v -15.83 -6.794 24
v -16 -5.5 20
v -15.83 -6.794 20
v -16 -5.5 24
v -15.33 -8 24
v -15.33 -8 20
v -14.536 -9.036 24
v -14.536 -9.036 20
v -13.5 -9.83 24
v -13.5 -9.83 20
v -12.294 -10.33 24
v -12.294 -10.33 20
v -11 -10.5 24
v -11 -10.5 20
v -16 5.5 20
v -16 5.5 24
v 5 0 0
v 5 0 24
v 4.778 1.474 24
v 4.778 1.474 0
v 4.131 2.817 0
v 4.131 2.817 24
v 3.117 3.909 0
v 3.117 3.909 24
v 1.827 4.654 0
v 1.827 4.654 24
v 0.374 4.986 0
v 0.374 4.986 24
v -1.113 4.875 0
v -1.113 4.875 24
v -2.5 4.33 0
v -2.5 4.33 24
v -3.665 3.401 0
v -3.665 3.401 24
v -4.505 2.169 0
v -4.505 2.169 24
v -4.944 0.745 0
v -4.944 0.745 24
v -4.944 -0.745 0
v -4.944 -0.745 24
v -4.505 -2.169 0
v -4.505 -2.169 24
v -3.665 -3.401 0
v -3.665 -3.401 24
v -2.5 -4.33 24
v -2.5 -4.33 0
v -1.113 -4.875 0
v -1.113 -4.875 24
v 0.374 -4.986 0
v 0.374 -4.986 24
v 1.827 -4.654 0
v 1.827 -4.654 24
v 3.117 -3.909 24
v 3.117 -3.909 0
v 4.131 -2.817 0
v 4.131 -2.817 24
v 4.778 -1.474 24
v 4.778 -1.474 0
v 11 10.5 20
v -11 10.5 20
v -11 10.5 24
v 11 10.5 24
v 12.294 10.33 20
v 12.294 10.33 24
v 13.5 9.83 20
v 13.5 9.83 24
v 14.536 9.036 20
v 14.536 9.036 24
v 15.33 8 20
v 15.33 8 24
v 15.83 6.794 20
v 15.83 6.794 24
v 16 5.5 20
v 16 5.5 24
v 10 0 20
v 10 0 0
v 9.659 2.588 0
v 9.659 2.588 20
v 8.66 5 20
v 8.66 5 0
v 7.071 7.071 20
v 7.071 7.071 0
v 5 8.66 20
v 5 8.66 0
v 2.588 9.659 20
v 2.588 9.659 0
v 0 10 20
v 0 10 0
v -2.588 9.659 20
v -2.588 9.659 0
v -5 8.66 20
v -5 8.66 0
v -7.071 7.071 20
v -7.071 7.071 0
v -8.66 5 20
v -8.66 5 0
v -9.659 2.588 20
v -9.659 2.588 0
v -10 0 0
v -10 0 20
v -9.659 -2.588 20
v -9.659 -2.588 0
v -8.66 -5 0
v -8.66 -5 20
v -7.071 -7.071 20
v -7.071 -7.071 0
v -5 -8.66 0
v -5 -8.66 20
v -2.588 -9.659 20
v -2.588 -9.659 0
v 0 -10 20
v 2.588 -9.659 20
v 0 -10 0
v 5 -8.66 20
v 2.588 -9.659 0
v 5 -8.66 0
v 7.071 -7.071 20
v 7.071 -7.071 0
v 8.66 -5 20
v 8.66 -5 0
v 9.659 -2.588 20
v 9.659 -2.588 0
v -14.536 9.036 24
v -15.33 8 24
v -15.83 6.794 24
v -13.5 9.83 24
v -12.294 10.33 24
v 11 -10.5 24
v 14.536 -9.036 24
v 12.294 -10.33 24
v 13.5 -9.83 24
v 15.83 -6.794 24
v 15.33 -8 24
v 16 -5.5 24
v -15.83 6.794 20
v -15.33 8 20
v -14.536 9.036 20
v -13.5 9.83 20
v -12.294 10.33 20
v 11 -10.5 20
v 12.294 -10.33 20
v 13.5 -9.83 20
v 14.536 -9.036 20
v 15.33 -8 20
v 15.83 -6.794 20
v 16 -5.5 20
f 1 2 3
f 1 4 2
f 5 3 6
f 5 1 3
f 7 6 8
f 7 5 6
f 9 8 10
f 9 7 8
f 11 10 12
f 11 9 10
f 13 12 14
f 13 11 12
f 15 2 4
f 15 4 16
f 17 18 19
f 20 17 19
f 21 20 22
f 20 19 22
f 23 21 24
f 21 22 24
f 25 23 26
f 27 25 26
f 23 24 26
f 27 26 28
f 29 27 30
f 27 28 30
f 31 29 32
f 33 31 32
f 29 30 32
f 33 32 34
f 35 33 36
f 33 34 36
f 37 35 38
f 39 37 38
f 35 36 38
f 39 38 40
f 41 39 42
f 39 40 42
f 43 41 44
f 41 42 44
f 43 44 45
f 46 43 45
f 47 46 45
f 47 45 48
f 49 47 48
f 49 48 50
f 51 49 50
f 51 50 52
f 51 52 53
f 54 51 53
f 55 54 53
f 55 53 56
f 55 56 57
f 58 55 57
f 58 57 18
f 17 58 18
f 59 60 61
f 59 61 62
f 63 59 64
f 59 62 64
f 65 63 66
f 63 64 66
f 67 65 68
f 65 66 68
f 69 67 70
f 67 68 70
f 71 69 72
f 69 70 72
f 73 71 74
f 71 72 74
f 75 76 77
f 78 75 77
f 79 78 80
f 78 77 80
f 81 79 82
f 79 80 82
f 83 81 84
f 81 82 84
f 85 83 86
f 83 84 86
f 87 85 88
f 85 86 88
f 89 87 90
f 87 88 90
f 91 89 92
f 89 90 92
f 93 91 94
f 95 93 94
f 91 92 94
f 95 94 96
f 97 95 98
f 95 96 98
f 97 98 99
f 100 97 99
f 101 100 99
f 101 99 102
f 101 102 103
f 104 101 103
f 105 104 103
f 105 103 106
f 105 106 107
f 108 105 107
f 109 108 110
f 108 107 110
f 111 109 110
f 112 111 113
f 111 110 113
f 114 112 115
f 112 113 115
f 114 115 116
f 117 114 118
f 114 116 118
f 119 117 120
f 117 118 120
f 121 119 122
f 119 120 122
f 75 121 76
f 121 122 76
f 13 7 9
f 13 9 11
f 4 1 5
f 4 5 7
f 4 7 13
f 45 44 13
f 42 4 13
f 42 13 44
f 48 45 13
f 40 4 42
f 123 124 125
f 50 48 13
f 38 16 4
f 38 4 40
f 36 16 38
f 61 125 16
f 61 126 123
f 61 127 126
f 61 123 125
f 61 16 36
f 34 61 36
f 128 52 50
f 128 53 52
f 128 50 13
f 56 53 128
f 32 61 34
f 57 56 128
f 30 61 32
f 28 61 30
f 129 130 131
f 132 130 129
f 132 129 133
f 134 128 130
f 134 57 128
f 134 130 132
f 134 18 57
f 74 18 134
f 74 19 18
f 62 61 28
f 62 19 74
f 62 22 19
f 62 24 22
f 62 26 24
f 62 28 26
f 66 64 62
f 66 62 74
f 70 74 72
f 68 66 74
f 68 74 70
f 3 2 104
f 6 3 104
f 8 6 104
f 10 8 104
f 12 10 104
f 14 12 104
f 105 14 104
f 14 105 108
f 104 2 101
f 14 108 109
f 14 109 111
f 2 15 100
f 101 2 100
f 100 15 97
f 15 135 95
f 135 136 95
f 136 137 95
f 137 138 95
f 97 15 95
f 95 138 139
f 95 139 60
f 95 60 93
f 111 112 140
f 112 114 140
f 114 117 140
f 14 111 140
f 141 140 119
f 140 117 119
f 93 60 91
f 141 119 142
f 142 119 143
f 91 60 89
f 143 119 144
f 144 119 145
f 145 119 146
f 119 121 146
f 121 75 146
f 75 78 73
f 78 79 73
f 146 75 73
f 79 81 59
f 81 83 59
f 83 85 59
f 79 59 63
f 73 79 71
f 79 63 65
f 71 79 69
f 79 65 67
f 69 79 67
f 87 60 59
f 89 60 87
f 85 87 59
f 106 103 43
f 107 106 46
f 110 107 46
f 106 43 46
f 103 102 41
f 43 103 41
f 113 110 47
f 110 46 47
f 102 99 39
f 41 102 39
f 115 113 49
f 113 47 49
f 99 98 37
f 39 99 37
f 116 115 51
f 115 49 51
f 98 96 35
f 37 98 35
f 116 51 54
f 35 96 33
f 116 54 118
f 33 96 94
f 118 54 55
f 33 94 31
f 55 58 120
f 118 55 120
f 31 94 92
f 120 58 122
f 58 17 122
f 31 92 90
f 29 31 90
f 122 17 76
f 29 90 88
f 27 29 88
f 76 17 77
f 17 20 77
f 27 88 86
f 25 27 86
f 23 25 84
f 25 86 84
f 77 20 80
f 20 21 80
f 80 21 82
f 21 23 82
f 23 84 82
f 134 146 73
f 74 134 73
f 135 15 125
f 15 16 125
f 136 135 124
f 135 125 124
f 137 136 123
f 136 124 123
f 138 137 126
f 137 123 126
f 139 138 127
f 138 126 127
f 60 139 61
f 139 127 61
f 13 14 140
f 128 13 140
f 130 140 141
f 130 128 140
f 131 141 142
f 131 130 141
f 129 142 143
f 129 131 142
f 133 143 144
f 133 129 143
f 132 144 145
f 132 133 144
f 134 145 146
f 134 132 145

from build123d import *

# Parameters (mm, degrees)
F0_R     = 10
F1_DEPTH = 20
F2_W     = 32
F2_H     = 21
F3_DEPTH = 4
F4_R     = 5
F5_DEPTH = 25
F6_R     = 5


with BuildPart() as f1:
    # F0 (on Top) → F1 (new body)
    with BuildSketch(Plane.XY):
        Circle(F0_R)
    extrude(amount=F1_DEPTH)

    # F2 (on face) → F3 (join)
    with BuildSketch(Plane.XY.offset(20)):
        Rectangle(F2_W, F2_H)
    extrude(amount=F3_DEPTH)

    # F4 (on face) → F5 (cut)
    with BuildSketch(Plane.XY.offset(24)):
        Circle(F4_R)
    extrude(amount=-F5_DEPTH, mode=Mode.SUBTRACT)

    # F6
    f6_edges = [f1.edges().sort_by_distance(p)[0] for p in [
        (16, 10.5, 22),
        (-16, 10.5, 22),
        (-16, -10.5, 22),
        (16, -10.5, 22),
    ]]
    fillet(f6_edges, radius=F6_R)


solid = f1.part
